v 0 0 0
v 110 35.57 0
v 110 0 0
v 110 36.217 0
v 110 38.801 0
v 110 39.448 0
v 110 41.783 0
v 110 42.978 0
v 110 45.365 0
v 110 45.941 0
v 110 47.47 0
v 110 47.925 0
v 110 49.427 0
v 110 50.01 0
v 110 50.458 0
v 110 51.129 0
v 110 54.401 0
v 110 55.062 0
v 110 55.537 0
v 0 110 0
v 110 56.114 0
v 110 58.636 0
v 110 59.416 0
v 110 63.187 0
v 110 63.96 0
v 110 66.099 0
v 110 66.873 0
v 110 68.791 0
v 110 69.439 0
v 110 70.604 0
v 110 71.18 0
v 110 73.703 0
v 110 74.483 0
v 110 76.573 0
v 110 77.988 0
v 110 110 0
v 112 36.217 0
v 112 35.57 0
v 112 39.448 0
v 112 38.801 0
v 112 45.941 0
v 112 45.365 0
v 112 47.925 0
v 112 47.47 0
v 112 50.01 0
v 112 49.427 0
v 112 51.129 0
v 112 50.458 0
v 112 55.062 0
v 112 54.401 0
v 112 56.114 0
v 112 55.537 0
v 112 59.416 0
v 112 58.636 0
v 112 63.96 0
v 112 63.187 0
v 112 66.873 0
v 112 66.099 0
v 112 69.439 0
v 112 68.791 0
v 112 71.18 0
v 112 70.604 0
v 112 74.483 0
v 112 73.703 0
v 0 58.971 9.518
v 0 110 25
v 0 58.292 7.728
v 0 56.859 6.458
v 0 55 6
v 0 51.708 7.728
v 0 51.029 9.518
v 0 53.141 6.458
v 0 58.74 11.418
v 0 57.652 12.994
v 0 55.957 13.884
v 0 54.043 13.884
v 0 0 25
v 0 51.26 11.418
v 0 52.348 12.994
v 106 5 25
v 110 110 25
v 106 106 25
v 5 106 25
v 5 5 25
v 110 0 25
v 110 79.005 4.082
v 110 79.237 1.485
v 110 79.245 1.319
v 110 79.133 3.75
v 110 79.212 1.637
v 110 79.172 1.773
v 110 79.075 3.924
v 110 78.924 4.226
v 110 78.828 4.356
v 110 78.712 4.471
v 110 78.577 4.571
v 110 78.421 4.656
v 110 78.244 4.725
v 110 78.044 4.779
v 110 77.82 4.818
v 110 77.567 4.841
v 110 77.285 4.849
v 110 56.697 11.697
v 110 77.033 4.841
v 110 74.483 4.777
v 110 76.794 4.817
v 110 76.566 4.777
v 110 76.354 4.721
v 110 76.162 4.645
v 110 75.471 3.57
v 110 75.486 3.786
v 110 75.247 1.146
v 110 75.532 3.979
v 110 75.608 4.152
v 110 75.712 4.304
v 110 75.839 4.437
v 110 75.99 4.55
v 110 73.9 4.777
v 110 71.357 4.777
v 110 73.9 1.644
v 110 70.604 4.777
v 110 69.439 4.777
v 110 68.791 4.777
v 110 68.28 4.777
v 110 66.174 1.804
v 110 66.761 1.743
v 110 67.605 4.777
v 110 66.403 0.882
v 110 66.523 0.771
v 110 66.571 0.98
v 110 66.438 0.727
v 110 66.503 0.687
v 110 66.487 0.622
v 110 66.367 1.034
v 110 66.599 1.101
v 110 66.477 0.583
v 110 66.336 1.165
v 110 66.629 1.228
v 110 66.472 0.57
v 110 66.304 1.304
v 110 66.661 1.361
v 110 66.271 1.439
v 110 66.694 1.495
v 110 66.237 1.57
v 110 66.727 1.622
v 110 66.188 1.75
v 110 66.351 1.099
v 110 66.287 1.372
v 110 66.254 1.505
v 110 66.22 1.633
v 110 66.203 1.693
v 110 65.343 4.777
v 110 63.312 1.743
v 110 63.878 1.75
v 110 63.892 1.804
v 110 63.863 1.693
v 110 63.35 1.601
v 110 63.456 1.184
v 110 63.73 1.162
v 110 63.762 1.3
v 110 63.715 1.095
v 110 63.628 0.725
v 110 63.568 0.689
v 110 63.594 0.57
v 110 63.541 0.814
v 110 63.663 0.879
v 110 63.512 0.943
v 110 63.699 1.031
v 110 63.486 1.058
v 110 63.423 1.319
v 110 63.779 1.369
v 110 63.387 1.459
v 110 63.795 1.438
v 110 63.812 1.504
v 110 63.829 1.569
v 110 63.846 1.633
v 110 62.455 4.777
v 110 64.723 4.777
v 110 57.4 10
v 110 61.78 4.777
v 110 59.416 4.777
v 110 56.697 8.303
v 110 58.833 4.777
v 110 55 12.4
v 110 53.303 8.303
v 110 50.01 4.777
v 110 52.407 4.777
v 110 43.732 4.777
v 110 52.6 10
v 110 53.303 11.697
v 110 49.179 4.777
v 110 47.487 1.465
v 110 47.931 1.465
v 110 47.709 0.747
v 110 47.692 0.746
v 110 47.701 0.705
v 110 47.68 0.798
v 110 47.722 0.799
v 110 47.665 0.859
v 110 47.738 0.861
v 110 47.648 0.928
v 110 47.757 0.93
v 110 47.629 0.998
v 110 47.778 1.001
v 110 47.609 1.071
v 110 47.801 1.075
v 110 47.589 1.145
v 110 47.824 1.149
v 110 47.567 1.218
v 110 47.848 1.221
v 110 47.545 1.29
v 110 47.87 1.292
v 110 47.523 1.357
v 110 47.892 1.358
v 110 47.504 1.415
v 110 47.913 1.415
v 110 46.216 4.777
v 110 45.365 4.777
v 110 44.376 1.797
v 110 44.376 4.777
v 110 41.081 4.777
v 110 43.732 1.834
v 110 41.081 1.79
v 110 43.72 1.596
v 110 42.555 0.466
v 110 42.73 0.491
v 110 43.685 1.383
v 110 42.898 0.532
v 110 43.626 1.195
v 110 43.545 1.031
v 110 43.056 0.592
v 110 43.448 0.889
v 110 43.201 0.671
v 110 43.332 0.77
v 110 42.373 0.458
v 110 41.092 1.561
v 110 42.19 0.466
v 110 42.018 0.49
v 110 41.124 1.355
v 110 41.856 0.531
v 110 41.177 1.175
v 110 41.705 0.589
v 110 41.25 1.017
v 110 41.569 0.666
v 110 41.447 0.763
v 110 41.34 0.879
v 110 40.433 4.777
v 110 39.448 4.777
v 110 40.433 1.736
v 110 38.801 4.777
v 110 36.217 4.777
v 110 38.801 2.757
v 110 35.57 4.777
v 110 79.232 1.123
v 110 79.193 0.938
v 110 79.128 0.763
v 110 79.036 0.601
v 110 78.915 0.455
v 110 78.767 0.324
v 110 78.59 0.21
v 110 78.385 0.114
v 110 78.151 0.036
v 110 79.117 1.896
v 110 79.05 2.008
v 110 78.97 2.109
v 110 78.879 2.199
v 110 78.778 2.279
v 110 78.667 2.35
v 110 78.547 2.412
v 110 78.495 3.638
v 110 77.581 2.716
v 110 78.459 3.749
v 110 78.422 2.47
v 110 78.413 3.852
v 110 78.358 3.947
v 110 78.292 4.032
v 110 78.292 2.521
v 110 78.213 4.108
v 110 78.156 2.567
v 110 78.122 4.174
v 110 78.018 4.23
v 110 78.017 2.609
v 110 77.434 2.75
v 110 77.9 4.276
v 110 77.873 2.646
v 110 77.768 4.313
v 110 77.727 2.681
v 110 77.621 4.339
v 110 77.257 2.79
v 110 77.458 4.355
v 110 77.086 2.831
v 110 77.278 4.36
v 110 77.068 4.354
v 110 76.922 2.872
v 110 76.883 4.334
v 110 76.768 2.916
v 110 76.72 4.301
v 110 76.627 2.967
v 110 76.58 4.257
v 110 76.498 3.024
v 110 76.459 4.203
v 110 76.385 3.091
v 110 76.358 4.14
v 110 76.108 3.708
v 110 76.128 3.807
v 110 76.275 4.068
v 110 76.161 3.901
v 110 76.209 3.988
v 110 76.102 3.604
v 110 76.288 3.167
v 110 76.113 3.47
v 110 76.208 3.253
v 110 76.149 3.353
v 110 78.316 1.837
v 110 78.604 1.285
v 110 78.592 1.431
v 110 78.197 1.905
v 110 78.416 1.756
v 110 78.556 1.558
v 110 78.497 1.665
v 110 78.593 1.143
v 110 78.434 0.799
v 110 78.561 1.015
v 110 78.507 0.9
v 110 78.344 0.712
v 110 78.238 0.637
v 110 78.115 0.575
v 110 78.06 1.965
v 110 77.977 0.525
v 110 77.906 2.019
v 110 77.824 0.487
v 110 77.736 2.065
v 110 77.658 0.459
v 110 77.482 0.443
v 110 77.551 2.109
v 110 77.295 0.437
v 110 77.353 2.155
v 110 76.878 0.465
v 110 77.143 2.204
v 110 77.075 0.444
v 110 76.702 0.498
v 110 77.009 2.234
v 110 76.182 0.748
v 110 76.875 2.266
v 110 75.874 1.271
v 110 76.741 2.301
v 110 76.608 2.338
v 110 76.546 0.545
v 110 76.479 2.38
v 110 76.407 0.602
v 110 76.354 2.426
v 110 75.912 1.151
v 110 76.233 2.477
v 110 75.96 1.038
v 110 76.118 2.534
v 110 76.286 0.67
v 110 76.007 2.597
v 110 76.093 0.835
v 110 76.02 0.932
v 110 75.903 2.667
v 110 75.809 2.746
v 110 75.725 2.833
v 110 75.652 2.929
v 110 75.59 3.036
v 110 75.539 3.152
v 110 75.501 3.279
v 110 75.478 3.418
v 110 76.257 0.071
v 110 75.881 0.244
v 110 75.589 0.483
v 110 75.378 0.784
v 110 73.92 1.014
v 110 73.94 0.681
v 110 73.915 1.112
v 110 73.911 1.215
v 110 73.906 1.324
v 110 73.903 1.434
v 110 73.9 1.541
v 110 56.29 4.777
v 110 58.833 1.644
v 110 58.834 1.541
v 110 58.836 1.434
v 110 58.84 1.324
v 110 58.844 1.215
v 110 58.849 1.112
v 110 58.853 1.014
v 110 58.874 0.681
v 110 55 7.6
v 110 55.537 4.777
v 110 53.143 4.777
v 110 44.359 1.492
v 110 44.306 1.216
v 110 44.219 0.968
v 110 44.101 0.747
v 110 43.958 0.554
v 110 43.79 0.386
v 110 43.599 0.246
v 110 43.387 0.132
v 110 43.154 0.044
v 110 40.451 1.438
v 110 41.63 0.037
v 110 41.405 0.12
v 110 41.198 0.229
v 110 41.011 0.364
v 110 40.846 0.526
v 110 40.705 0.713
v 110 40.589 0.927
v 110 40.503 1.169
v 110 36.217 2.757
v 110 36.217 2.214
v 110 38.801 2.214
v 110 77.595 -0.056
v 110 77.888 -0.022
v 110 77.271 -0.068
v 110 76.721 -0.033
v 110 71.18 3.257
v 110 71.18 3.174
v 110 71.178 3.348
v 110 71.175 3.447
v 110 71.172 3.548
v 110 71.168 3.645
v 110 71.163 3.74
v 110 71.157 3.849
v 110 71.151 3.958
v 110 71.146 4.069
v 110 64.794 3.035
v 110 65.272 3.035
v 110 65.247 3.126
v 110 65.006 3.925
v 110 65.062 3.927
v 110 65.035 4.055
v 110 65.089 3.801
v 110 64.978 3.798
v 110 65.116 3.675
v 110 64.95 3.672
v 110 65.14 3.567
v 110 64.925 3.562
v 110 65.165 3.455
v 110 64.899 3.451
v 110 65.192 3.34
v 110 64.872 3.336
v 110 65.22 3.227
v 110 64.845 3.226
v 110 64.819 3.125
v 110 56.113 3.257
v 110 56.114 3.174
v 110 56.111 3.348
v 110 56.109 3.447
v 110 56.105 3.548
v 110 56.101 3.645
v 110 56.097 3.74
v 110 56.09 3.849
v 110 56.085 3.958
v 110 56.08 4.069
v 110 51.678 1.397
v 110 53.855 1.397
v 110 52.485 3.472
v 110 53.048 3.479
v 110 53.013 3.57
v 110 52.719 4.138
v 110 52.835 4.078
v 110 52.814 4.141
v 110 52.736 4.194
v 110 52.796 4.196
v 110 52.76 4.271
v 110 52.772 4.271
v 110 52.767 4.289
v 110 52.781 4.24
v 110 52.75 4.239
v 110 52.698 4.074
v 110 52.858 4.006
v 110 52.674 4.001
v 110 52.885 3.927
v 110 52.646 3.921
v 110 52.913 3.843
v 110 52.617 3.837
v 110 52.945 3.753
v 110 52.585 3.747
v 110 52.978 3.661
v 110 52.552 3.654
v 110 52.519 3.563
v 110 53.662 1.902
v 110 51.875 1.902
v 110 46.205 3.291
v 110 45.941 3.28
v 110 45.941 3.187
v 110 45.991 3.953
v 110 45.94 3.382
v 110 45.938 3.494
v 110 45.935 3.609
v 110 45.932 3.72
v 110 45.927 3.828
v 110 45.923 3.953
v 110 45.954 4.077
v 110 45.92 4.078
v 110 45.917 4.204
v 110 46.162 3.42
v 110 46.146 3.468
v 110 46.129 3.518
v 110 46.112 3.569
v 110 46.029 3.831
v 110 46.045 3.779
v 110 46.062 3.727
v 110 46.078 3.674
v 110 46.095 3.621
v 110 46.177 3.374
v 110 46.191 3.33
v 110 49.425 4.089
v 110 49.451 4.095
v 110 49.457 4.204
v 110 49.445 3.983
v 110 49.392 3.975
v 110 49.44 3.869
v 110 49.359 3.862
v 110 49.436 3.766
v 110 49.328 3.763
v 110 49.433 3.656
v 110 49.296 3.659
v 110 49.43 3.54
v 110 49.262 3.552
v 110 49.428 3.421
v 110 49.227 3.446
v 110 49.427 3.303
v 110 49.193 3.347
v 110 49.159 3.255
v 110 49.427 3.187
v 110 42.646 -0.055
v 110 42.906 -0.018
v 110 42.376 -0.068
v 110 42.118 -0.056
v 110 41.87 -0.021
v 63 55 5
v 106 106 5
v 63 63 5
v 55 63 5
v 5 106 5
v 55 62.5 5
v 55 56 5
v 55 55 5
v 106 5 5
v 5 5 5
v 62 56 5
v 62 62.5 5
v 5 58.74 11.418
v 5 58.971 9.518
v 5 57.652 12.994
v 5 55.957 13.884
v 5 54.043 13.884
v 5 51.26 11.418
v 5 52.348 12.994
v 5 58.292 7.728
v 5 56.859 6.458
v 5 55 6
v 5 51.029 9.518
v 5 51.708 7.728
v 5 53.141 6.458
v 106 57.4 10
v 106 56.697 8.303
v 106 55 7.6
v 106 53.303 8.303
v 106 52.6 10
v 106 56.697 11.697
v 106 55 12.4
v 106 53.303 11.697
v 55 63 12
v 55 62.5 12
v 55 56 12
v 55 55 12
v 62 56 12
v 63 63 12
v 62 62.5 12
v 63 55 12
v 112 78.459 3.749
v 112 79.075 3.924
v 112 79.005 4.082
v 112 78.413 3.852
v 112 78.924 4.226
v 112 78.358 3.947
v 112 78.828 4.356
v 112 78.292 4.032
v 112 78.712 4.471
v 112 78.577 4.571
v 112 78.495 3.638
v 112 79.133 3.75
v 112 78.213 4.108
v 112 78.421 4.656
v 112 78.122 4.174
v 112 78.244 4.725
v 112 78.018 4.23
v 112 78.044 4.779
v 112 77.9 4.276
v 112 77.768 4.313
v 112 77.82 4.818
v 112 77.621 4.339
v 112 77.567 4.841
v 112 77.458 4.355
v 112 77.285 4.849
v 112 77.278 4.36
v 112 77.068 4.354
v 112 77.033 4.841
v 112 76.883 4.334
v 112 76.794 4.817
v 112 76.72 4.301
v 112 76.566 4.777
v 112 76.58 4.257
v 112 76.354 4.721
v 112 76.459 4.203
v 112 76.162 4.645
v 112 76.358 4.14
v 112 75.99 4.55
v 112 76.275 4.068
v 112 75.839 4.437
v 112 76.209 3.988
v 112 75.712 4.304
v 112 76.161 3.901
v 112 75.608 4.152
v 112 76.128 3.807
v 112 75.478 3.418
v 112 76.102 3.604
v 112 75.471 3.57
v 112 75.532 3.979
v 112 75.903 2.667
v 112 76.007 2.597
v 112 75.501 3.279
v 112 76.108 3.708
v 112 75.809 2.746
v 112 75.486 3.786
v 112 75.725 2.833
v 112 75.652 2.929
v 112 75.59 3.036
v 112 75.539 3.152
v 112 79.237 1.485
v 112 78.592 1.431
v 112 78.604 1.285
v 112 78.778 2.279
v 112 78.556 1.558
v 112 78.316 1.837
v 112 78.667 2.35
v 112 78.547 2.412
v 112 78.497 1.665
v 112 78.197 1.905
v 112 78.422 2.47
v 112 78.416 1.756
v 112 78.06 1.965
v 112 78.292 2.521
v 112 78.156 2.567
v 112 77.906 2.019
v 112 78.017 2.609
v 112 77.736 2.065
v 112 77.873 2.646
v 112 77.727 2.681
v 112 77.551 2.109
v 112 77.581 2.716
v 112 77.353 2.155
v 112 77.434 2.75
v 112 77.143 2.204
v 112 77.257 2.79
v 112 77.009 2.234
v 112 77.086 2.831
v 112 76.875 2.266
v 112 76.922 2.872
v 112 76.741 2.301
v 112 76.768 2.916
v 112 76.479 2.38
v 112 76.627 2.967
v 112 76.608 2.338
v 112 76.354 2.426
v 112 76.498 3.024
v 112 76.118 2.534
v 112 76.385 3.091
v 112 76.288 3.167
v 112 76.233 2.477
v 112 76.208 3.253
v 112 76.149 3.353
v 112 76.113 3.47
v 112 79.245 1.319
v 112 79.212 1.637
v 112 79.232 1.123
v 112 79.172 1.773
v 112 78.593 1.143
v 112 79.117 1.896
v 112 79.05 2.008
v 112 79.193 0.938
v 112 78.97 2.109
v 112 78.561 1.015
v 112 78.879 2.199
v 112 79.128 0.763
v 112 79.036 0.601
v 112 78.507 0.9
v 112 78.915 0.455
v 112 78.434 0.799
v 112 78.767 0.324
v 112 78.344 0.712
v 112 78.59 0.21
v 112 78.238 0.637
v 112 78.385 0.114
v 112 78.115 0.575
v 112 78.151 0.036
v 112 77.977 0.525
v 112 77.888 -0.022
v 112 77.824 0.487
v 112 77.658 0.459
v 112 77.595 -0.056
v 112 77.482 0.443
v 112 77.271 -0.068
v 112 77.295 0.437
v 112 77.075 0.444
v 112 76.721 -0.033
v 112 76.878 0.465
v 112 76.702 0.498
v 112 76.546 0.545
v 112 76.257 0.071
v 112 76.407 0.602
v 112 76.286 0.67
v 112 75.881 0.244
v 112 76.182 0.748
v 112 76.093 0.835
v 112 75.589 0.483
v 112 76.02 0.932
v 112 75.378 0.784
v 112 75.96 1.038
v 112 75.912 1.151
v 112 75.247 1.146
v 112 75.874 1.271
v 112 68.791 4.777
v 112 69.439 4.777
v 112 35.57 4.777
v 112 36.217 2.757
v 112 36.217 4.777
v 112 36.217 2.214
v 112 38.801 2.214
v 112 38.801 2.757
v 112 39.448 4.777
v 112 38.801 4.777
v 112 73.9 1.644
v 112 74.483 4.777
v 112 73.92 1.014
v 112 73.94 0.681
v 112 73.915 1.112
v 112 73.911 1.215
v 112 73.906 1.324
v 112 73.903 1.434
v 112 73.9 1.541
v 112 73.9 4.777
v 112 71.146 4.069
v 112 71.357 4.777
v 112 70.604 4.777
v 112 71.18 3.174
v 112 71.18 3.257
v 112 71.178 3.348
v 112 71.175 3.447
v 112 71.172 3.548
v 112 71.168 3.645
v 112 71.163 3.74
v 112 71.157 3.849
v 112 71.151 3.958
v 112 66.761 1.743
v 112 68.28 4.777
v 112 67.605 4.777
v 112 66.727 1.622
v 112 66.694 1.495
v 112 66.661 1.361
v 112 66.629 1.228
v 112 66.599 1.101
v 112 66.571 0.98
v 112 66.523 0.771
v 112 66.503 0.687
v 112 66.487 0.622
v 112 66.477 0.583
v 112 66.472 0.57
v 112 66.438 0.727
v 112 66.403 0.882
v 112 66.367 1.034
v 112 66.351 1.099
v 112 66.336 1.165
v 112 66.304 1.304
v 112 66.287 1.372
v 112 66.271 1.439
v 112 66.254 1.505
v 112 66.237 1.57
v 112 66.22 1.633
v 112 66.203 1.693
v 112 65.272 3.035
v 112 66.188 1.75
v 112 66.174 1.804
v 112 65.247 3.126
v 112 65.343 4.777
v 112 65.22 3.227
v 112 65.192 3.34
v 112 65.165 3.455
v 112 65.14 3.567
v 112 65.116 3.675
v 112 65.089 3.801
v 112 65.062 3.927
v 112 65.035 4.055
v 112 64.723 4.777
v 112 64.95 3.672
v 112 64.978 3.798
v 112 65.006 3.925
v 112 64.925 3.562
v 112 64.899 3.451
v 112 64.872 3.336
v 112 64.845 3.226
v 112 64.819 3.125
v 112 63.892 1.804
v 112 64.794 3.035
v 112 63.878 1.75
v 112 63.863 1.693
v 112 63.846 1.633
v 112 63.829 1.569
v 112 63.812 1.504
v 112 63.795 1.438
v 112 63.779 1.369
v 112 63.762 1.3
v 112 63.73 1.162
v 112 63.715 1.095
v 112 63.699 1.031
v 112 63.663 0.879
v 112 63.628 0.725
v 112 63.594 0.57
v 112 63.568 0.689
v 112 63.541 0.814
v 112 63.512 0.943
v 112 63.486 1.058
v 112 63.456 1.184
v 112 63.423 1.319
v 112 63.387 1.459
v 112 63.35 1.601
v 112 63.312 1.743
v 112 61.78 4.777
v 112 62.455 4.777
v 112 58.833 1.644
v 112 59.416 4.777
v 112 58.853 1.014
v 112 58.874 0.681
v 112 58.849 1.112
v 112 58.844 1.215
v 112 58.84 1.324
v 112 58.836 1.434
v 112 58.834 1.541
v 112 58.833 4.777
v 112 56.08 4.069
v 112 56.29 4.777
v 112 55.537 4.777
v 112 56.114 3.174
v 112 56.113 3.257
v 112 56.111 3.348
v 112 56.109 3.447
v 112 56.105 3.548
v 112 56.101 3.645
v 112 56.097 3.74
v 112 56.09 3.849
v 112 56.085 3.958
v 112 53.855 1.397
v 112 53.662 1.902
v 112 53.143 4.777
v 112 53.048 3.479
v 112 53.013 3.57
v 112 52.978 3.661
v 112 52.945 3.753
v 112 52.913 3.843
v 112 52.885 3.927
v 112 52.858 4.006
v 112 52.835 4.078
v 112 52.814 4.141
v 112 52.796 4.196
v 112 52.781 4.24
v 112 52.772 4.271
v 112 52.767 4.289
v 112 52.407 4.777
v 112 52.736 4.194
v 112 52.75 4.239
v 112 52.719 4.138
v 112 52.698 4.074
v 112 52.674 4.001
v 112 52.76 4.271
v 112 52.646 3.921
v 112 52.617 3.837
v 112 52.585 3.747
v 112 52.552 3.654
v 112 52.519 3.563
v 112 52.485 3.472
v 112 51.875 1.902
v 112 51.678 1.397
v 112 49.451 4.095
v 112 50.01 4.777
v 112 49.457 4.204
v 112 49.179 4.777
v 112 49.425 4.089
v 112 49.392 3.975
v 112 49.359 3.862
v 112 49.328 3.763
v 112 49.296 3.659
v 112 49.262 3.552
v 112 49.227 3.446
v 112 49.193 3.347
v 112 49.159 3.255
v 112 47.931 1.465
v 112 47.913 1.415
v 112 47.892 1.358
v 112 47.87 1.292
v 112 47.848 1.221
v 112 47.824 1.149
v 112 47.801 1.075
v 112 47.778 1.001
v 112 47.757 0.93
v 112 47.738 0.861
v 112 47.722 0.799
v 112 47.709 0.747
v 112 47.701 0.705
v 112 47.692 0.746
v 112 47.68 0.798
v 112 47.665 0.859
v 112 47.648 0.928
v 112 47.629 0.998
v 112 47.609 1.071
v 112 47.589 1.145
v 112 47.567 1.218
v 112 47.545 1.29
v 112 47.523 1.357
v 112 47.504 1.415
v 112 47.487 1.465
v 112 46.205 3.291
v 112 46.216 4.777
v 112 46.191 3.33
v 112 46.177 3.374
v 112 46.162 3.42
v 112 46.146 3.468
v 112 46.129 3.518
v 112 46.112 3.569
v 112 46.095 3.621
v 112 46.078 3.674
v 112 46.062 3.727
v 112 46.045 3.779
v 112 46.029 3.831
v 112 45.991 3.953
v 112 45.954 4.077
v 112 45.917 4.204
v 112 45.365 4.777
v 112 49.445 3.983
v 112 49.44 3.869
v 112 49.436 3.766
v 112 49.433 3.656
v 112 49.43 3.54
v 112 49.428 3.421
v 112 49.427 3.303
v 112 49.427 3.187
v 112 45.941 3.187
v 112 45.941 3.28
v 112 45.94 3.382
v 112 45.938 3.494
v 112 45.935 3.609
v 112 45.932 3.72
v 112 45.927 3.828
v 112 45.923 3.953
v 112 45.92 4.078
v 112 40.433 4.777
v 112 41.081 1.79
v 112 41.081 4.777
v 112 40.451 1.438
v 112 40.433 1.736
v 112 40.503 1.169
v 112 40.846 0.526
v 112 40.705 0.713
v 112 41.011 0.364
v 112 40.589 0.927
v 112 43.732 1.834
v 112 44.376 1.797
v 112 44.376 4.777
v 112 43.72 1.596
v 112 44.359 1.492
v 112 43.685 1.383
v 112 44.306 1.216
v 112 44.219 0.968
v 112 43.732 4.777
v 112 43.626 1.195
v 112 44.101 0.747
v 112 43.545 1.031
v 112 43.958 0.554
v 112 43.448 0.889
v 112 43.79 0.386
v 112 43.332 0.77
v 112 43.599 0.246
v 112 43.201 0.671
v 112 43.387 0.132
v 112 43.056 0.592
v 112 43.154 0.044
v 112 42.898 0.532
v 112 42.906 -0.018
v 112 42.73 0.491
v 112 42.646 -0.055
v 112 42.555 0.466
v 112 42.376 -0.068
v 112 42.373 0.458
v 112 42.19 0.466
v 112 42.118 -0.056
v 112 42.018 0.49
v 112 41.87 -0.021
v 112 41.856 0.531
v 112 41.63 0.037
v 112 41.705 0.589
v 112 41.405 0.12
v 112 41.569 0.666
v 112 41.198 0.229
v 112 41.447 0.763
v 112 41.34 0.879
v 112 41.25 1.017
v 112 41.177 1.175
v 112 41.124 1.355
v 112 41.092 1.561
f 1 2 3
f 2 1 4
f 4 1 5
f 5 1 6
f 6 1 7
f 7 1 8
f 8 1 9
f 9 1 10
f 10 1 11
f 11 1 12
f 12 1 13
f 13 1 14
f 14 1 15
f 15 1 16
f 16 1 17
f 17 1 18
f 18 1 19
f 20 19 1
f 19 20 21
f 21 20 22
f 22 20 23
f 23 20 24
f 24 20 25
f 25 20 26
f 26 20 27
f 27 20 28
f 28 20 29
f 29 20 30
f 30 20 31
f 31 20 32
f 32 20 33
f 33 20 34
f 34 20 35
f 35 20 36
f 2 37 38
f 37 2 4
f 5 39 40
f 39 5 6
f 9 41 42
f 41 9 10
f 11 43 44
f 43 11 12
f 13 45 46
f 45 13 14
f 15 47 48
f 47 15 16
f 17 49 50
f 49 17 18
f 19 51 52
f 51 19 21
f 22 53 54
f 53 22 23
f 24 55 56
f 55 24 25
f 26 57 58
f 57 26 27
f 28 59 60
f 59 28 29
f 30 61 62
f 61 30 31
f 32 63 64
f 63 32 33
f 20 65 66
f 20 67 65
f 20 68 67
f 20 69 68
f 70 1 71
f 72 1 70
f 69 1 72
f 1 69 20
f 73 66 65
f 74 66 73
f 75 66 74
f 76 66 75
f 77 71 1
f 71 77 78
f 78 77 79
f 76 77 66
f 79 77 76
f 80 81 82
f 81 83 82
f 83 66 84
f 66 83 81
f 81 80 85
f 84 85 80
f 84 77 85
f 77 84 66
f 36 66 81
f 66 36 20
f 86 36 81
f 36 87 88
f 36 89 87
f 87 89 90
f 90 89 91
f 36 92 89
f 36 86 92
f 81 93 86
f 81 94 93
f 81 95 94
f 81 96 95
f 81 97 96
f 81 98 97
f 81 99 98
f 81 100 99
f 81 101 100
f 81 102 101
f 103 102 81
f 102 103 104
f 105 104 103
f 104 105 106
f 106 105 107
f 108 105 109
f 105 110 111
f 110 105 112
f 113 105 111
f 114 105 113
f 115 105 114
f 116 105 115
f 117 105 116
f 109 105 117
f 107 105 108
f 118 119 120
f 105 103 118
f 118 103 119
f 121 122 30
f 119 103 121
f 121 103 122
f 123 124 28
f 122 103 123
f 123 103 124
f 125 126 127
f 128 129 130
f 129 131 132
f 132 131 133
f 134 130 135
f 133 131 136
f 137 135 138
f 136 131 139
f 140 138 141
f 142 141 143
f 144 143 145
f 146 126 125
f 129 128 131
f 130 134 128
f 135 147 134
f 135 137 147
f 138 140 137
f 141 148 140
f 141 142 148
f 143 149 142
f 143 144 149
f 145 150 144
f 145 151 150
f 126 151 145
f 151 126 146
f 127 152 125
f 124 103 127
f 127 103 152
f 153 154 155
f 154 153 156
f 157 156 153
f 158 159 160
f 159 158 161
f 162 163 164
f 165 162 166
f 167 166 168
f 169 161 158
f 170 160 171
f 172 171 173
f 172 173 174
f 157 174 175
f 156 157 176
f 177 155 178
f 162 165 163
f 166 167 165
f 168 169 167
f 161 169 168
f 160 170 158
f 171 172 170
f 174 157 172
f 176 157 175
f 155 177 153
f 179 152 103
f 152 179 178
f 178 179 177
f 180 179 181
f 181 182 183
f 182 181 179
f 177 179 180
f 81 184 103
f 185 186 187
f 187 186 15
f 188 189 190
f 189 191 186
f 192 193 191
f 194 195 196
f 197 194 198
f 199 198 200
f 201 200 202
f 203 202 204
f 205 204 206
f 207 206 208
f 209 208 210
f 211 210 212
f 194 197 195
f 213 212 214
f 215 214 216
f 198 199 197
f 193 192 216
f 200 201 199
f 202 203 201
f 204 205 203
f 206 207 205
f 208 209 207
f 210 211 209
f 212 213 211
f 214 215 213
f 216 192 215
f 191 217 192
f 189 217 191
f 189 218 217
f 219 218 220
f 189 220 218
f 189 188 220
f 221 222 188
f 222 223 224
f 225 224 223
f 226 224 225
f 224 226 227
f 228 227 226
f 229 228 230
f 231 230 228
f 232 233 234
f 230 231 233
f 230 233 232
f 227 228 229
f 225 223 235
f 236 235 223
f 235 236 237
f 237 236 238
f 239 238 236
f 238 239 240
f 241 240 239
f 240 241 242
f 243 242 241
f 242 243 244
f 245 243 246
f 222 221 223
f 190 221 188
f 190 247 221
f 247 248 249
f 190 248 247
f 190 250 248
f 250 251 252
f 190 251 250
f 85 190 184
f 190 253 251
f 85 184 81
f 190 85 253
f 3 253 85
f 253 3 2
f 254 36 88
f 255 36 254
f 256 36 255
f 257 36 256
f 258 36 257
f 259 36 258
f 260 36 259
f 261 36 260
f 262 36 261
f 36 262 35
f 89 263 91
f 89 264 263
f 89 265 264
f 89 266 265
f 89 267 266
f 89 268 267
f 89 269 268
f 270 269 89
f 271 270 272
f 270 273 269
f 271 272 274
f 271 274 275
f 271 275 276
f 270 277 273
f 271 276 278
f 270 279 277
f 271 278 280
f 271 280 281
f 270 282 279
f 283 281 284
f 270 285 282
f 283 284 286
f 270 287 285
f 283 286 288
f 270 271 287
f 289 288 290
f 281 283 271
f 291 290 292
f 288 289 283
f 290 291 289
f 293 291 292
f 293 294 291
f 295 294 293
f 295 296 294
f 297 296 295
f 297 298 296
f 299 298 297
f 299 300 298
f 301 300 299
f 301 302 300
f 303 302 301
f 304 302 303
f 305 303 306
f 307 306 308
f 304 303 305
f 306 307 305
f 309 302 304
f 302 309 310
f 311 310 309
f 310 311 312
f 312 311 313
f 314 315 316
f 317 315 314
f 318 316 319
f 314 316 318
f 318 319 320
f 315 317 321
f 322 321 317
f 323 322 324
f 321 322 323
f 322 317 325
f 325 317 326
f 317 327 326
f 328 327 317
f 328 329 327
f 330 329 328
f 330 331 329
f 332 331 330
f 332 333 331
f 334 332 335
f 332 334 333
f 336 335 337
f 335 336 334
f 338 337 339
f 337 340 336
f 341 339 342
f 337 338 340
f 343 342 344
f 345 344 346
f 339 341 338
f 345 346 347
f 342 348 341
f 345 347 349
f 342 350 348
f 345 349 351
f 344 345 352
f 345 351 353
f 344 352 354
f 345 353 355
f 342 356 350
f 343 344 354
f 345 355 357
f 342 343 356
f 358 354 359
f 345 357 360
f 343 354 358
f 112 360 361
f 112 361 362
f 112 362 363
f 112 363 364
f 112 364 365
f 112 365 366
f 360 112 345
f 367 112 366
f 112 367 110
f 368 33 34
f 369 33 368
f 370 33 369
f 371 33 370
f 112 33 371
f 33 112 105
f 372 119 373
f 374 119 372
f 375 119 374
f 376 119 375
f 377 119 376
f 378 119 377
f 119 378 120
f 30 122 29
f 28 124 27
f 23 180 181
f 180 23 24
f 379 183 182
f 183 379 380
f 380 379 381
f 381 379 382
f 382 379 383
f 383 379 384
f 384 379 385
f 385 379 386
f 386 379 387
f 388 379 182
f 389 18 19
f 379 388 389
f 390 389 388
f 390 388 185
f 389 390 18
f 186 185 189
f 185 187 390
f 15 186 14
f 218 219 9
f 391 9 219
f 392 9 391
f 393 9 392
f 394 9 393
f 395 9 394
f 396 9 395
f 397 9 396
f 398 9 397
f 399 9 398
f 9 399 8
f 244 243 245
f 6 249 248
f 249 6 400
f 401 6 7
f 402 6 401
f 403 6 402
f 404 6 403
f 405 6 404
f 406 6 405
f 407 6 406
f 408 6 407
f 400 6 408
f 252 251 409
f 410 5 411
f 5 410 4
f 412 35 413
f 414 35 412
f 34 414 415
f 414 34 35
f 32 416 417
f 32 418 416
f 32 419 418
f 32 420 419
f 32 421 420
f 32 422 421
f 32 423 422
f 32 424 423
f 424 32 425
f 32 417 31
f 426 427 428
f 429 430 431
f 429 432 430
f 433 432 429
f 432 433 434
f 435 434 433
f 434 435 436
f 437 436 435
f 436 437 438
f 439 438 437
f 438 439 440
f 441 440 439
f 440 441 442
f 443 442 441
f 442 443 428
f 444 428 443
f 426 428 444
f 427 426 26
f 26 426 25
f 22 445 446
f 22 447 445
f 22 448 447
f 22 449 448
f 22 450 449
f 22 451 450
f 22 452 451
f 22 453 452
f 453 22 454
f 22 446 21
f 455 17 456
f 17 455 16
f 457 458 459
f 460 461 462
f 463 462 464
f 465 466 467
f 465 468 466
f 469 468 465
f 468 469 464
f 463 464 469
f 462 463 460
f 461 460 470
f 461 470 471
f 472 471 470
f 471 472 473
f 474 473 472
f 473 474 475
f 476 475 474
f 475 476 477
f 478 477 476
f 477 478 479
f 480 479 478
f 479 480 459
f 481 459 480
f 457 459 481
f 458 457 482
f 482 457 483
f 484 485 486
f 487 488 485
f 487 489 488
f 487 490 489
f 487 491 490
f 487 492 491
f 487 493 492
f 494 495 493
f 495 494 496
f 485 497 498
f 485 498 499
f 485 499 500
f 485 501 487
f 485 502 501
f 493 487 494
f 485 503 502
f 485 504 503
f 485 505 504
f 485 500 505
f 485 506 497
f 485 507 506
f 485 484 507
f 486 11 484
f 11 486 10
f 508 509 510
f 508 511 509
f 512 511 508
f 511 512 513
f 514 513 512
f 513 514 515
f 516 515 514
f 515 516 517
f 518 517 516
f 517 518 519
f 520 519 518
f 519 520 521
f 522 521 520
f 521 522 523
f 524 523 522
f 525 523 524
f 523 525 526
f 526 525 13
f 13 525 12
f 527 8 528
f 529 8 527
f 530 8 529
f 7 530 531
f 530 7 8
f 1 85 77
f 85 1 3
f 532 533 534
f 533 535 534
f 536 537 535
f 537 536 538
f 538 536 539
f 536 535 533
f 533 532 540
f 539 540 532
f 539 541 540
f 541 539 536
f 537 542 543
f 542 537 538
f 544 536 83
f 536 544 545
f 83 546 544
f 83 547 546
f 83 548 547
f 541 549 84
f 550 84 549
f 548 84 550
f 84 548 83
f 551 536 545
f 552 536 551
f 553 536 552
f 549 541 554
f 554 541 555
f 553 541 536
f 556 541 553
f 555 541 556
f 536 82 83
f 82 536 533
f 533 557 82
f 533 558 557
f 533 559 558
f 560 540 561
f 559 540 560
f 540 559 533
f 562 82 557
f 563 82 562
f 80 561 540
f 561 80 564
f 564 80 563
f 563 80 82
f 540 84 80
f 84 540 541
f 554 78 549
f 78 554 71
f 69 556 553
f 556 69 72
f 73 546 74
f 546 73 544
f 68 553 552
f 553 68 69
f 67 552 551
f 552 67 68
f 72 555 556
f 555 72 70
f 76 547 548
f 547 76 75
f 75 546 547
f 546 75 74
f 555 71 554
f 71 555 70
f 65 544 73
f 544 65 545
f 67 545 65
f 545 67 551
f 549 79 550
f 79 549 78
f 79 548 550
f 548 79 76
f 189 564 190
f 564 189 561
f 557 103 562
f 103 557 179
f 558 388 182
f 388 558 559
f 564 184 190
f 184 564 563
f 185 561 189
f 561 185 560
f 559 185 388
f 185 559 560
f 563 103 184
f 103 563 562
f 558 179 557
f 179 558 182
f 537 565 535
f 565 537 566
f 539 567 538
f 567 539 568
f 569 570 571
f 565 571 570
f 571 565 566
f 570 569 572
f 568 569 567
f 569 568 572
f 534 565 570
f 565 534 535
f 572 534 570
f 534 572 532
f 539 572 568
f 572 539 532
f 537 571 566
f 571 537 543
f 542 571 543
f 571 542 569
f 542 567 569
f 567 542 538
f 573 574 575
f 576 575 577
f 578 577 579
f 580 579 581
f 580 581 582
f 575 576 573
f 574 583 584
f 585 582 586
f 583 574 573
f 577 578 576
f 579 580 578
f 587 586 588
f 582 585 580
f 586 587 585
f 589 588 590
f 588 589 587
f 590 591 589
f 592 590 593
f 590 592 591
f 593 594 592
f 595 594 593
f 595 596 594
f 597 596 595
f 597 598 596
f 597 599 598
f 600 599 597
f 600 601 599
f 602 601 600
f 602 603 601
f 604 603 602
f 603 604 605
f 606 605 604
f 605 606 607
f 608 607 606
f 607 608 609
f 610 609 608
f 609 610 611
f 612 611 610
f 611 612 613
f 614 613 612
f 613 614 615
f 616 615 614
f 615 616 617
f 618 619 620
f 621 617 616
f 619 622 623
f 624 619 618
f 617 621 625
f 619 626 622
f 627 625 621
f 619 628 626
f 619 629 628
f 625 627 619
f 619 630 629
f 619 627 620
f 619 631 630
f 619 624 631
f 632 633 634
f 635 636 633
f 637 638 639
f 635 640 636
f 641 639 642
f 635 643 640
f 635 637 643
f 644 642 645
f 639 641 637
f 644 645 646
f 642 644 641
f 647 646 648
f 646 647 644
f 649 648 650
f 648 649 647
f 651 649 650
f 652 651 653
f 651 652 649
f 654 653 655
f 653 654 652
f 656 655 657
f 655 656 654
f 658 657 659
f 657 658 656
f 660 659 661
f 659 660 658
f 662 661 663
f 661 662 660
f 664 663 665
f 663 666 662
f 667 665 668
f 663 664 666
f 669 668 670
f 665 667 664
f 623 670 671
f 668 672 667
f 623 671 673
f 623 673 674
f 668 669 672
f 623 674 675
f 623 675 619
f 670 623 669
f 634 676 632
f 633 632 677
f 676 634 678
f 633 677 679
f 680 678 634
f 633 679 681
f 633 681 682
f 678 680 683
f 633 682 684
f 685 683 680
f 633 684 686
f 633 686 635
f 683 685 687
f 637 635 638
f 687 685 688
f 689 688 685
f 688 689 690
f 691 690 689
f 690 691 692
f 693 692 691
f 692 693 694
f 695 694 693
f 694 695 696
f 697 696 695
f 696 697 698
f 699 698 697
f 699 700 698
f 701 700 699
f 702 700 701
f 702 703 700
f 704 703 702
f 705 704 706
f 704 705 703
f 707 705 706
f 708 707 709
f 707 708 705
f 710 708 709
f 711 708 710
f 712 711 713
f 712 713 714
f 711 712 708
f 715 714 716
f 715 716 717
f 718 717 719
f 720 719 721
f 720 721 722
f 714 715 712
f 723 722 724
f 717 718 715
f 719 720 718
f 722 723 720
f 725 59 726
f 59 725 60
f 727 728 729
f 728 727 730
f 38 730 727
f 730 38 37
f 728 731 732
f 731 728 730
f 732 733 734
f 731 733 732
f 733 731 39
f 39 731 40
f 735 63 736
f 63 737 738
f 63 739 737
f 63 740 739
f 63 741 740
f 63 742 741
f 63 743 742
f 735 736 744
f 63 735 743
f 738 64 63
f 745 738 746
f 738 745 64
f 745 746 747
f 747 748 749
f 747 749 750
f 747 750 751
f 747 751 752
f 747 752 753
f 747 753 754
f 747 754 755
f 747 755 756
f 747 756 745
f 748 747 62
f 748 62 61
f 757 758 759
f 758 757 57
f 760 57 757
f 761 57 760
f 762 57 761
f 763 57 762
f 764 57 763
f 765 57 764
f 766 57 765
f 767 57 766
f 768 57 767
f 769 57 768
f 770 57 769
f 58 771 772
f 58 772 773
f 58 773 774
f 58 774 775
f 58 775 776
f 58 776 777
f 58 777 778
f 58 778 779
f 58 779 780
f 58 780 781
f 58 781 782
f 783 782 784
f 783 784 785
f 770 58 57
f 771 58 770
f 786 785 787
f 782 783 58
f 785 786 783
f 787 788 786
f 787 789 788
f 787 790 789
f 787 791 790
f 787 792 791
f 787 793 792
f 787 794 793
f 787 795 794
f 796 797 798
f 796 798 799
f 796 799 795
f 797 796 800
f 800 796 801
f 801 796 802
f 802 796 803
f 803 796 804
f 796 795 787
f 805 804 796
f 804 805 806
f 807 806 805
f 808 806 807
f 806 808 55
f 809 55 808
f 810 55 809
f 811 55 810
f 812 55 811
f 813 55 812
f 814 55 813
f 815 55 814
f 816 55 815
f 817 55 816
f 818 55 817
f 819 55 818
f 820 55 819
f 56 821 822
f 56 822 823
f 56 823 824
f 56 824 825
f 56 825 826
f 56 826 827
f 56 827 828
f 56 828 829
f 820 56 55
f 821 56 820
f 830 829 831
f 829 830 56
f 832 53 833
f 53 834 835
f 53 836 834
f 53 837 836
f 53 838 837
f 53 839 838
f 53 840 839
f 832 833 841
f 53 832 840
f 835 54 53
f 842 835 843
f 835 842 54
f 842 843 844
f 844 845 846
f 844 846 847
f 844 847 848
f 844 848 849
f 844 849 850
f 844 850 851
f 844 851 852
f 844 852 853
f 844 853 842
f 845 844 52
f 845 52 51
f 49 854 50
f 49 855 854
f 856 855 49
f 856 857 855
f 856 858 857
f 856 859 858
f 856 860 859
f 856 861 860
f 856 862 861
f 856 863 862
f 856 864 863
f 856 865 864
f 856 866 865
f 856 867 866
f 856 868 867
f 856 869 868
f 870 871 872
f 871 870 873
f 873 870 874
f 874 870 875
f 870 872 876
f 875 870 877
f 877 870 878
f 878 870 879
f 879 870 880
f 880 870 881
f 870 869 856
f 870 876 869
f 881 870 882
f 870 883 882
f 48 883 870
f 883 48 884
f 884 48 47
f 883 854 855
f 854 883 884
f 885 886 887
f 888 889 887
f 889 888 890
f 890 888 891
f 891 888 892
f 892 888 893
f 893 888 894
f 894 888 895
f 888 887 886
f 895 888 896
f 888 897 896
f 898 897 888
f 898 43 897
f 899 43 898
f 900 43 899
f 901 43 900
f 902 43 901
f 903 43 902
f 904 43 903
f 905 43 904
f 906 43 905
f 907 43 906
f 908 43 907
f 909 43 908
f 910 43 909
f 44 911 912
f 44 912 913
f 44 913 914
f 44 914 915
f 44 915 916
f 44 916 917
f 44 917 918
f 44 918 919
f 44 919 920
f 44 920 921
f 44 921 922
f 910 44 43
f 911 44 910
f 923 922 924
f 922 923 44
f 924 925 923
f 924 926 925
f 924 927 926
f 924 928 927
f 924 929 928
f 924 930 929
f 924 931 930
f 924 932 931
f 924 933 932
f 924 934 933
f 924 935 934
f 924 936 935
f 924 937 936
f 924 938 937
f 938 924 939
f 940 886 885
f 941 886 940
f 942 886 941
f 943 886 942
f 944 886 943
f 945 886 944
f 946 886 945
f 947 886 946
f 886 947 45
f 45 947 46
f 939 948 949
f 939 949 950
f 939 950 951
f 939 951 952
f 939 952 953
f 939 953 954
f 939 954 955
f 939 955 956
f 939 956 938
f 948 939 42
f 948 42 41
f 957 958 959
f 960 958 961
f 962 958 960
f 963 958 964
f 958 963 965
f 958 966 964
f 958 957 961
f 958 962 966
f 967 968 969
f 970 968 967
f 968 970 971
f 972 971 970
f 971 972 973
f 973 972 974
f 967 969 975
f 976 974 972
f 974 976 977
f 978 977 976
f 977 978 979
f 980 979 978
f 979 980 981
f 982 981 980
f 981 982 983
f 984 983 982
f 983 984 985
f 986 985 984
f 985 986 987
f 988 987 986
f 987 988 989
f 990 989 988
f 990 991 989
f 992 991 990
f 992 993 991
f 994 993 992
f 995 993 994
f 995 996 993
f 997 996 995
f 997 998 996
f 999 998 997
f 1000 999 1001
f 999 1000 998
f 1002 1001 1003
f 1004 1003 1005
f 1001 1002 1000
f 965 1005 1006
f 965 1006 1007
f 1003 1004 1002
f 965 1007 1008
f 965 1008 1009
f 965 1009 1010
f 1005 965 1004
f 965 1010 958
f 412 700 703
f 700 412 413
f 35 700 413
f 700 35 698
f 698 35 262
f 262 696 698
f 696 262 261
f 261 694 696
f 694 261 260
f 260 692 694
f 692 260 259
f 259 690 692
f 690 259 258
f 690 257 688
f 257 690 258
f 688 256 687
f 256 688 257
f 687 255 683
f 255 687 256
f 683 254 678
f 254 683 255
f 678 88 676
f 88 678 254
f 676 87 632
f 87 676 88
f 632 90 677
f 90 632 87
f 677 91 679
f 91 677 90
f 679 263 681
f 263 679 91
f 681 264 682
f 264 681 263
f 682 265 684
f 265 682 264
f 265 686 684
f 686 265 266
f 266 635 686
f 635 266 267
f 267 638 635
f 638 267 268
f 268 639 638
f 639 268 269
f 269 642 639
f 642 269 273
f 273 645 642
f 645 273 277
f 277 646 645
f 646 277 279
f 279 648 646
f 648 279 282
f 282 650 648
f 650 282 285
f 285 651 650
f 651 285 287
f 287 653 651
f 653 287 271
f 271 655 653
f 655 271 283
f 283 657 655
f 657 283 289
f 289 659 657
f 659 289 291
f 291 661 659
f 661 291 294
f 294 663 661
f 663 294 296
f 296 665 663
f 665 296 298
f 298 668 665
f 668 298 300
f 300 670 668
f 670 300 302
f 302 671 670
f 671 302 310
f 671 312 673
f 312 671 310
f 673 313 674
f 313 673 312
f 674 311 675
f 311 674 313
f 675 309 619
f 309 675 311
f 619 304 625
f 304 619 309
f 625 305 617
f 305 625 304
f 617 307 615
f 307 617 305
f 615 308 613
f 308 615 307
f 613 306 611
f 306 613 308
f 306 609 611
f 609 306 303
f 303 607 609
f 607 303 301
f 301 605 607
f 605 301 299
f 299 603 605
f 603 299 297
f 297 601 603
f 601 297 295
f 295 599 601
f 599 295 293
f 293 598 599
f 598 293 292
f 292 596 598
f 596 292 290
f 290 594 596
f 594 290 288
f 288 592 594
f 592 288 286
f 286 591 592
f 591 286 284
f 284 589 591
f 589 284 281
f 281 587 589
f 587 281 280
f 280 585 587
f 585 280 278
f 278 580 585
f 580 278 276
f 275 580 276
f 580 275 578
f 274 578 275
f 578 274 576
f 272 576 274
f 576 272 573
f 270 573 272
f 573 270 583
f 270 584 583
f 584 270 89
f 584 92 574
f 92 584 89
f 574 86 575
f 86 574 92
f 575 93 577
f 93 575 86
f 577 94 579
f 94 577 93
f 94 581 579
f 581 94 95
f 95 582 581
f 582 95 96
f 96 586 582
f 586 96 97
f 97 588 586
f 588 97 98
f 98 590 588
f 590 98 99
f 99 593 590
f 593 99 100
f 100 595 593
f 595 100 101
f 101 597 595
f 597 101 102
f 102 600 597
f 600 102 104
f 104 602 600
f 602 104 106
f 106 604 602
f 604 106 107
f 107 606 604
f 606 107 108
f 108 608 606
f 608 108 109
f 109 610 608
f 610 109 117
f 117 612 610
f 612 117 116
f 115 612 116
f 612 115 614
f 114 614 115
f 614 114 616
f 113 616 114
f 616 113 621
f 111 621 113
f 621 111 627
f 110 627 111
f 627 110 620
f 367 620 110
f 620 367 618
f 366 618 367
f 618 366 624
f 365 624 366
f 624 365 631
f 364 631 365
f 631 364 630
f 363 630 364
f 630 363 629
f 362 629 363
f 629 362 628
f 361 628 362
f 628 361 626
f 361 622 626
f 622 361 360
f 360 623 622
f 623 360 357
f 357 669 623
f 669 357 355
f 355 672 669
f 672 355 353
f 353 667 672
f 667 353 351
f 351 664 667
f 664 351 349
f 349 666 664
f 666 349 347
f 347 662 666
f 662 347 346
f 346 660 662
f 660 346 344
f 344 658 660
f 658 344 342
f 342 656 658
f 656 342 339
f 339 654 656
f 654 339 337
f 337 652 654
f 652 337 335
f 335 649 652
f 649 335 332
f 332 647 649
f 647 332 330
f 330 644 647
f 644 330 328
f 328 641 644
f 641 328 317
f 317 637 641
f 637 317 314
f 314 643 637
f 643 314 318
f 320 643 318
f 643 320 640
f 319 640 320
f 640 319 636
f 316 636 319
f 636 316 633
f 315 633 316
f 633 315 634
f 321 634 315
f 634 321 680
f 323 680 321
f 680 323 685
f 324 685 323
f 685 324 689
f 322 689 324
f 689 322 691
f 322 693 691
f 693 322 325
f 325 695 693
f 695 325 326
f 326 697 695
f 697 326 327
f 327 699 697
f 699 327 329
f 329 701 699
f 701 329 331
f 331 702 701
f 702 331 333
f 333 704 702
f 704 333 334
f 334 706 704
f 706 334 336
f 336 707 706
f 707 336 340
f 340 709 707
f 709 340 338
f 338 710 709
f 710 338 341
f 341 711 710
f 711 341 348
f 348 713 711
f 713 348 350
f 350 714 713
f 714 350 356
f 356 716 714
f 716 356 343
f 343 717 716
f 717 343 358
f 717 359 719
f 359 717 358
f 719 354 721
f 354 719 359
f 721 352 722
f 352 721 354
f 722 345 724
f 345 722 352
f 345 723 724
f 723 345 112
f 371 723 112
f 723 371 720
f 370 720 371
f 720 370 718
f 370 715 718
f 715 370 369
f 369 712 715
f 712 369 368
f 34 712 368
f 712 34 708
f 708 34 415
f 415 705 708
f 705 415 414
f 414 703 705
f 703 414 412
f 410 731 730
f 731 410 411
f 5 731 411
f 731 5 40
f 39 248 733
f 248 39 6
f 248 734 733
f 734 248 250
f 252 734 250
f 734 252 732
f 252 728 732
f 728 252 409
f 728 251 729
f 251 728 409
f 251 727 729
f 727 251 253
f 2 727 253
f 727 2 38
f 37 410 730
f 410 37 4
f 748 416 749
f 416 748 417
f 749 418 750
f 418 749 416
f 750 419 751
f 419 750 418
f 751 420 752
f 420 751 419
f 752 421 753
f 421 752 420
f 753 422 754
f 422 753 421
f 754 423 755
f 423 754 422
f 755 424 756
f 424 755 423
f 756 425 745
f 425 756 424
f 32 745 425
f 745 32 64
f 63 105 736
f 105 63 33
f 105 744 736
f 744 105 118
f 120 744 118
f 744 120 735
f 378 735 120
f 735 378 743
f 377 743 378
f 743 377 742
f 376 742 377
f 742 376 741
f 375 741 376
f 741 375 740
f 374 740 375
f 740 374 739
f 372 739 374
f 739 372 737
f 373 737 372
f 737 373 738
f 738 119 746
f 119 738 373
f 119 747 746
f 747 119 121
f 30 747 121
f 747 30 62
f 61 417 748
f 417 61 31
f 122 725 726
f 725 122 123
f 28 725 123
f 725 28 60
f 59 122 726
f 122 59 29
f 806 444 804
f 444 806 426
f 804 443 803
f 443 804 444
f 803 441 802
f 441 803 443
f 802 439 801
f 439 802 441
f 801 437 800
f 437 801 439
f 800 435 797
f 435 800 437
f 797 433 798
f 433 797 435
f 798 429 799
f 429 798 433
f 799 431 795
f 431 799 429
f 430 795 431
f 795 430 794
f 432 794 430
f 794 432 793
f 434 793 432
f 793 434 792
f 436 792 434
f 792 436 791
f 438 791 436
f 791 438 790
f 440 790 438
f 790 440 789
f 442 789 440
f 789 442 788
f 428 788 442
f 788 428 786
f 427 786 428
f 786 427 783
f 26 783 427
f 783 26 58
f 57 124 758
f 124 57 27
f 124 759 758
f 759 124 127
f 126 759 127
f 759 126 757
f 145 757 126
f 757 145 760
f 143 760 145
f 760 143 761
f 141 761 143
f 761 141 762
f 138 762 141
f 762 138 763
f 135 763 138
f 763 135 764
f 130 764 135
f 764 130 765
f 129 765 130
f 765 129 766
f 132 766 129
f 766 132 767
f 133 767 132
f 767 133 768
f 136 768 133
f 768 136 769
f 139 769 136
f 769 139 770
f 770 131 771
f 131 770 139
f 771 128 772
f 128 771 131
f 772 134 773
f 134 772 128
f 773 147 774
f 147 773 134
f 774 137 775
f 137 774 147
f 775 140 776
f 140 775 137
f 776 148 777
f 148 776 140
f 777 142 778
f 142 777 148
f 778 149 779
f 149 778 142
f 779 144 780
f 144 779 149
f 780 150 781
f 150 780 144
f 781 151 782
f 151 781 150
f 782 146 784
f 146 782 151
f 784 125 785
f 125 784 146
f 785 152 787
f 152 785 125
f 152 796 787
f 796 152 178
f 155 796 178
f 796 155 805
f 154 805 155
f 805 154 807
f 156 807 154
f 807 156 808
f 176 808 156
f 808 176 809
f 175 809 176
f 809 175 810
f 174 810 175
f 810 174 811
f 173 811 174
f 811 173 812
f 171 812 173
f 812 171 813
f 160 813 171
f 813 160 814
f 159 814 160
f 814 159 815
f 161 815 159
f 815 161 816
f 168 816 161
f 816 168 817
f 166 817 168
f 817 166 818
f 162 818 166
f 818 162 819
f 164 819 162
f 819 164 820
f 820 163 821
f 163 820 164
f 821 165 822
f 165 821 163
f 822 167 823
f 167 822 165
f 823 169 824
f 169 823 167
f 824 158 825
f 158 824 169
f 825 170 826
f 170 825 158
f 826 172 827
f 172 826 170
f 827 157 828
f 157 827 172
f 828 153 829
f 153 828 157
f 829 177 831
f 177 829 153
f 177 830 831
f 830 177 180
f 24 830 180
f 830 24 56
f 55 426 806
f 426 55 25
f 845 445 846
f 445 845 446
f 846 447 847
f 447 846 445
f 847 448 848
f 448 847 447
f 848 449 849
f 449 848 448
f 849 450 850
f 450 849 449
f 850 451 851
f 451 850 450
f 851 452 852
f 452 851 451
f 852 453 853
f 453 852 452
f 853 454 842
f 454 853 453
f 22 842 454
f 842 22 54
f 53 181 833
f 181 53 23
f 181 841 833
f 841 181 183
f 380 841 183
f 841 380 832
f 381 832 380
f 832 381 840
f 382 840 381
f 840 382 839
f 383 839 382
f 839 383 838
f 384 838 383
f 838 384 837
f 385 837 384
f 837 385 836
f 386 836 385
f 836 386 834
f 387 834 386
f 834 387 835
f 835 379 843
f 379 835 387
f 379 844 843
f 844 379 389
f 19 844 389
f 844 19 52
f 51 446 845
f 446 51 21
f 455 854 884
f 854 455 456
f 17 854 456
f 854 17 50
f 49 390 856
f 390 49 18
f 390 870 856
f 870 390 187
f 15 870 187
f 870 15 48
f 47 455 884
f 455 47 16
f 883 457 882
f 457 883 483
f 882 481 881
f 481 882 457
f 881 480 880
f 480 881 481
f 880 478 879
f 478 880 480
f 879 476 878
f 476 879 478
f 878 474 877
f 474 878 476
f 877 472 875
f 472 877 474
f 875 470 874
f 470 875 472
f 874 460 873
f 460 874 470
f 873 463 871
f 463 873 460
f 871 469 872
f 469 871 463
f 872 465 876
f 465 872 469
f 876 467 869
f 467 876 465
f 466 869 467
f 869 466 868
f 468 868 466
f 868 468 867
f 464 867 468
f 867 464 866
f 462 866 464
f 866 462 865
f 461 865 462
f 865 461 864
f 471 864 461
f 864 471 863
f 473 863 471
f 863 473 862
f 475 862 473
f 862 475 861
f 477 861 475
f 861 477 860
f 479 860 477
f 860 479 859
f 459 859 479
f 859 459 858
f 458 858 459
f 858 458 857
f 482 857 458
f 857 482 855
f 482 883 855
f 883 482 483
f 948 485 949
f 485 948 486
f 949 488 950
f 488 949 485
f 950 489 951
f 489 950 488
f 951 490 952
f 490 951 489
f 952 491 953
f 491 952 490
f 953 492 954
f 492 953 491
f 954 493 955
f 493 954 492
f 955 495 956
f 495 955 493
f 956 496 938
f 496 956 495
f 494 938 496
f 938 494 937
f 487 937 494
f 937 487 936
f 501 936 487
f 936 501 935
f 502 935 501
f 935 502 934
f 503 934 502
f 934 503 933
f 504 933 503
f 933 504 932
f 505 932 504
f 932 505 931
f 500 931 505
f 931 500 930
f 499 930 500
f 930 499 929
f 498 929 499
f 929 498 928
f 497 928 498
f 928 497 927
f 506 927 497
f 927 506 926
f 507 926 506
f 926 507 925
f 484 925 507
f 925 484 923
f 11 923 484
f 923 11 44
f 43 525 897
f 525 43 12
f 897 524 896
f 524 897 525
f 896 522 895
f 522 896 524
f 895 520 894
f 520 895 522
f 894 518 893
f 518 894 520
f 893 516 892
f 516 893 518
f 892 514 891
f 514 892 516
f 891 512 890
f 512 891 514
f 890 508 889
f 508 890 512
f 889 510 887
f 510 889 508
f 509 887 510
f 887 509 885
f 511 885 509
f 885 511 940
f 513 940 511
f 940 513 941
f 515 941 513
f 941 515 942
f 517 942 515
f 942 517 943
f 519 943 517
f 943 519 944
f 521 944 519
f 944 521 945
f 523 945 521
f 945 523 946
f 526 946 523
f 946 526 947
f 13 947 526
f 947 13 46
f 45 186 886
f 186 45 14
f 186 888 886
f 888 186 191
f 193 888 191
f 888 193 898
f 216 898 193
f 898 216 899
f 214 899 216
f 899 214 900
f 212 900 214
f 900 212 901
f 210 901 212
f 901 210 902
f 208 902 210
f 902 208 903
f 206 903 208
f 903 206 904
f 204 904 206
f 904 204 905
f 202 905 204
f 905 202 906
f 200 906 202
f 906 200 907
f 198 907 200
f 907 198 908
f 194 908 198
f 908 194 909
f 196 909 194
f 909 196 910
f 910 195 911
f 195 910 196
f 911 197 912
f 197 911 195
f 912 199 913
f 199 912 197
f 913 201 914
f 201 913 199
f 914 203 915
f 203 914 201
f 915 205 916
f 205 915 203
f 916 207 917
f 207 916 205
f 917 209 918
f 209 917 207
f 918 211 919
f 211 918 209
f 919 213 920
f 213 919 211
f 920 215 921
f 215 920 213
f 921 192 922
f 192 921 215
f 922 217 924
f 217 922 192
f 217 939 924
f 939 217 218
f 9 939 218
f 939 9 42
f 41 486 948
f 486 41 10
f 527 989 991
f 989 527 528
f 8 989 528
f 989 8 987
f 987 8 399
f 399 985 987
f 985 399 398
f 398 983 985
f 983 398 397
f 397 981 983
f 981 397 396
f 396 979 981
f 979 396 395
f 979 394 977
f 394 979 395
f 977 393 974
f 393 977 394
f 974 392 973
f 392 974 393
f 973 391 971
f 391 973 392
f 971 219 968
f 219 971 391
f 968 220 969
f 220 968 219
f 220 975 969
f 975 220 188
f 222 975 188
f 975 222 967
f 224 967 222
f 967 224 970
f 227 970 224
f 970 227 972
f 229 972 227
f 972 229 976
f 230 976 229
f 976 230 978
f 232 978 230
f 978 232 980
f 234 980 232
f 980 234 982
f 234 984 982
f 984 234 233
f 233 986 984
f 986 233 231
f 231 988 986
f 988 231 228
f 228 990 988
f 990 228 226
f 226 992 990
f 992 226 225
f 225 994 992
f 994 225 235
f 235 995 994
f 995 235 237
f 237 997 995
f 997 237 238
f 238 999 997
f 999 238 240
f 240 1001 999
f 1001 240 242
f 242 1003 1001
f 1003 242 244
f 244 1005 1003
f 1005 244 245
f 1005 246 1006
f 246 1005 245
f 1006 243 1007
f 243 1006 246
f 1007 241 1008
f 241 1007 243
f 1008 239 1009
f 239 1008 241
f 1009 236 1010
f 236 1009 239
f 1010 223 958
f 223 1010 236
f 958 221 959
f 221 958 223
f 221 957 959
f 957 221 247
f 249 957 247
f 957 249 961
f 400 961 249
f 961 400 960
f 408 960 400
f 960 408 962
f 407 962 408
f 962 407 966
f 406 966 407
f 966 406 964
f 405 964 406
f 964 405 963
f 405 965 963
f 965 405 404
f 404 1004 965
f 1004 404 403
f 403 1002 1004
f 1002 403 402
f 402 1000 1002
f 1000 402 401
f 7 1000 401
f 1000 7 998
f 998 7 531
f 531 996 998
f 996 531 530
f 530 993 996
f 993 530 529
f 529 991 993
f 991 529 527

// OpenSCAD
module basic_box()
{
    difference()
    {
        linear_extrude(25) square([110,110]);
        translate([5,5,5]) linear_extrude(25) square([101,101]);
    }
}


difference()
{
    basic_box();
    union()
    {
    translate([-5,55,10]) rotate([0,90,0]) cylinder(11,4,4);
    translate([100,55,10]) rotate([0,90,0]) cylinder(11,2.4,2.4);
    }
}


translate([55,55,0])
difference()
{
    linear_extrude(12) square([8,8]);
    translate([-1,1,5]) linear_extrude(16) square([8,6.5]);
}

translate([110,35,0]) rotate([90,0,0]) rotate([0,90,0]) linear_extrude(2) text("HUMAN WINS", 5);
